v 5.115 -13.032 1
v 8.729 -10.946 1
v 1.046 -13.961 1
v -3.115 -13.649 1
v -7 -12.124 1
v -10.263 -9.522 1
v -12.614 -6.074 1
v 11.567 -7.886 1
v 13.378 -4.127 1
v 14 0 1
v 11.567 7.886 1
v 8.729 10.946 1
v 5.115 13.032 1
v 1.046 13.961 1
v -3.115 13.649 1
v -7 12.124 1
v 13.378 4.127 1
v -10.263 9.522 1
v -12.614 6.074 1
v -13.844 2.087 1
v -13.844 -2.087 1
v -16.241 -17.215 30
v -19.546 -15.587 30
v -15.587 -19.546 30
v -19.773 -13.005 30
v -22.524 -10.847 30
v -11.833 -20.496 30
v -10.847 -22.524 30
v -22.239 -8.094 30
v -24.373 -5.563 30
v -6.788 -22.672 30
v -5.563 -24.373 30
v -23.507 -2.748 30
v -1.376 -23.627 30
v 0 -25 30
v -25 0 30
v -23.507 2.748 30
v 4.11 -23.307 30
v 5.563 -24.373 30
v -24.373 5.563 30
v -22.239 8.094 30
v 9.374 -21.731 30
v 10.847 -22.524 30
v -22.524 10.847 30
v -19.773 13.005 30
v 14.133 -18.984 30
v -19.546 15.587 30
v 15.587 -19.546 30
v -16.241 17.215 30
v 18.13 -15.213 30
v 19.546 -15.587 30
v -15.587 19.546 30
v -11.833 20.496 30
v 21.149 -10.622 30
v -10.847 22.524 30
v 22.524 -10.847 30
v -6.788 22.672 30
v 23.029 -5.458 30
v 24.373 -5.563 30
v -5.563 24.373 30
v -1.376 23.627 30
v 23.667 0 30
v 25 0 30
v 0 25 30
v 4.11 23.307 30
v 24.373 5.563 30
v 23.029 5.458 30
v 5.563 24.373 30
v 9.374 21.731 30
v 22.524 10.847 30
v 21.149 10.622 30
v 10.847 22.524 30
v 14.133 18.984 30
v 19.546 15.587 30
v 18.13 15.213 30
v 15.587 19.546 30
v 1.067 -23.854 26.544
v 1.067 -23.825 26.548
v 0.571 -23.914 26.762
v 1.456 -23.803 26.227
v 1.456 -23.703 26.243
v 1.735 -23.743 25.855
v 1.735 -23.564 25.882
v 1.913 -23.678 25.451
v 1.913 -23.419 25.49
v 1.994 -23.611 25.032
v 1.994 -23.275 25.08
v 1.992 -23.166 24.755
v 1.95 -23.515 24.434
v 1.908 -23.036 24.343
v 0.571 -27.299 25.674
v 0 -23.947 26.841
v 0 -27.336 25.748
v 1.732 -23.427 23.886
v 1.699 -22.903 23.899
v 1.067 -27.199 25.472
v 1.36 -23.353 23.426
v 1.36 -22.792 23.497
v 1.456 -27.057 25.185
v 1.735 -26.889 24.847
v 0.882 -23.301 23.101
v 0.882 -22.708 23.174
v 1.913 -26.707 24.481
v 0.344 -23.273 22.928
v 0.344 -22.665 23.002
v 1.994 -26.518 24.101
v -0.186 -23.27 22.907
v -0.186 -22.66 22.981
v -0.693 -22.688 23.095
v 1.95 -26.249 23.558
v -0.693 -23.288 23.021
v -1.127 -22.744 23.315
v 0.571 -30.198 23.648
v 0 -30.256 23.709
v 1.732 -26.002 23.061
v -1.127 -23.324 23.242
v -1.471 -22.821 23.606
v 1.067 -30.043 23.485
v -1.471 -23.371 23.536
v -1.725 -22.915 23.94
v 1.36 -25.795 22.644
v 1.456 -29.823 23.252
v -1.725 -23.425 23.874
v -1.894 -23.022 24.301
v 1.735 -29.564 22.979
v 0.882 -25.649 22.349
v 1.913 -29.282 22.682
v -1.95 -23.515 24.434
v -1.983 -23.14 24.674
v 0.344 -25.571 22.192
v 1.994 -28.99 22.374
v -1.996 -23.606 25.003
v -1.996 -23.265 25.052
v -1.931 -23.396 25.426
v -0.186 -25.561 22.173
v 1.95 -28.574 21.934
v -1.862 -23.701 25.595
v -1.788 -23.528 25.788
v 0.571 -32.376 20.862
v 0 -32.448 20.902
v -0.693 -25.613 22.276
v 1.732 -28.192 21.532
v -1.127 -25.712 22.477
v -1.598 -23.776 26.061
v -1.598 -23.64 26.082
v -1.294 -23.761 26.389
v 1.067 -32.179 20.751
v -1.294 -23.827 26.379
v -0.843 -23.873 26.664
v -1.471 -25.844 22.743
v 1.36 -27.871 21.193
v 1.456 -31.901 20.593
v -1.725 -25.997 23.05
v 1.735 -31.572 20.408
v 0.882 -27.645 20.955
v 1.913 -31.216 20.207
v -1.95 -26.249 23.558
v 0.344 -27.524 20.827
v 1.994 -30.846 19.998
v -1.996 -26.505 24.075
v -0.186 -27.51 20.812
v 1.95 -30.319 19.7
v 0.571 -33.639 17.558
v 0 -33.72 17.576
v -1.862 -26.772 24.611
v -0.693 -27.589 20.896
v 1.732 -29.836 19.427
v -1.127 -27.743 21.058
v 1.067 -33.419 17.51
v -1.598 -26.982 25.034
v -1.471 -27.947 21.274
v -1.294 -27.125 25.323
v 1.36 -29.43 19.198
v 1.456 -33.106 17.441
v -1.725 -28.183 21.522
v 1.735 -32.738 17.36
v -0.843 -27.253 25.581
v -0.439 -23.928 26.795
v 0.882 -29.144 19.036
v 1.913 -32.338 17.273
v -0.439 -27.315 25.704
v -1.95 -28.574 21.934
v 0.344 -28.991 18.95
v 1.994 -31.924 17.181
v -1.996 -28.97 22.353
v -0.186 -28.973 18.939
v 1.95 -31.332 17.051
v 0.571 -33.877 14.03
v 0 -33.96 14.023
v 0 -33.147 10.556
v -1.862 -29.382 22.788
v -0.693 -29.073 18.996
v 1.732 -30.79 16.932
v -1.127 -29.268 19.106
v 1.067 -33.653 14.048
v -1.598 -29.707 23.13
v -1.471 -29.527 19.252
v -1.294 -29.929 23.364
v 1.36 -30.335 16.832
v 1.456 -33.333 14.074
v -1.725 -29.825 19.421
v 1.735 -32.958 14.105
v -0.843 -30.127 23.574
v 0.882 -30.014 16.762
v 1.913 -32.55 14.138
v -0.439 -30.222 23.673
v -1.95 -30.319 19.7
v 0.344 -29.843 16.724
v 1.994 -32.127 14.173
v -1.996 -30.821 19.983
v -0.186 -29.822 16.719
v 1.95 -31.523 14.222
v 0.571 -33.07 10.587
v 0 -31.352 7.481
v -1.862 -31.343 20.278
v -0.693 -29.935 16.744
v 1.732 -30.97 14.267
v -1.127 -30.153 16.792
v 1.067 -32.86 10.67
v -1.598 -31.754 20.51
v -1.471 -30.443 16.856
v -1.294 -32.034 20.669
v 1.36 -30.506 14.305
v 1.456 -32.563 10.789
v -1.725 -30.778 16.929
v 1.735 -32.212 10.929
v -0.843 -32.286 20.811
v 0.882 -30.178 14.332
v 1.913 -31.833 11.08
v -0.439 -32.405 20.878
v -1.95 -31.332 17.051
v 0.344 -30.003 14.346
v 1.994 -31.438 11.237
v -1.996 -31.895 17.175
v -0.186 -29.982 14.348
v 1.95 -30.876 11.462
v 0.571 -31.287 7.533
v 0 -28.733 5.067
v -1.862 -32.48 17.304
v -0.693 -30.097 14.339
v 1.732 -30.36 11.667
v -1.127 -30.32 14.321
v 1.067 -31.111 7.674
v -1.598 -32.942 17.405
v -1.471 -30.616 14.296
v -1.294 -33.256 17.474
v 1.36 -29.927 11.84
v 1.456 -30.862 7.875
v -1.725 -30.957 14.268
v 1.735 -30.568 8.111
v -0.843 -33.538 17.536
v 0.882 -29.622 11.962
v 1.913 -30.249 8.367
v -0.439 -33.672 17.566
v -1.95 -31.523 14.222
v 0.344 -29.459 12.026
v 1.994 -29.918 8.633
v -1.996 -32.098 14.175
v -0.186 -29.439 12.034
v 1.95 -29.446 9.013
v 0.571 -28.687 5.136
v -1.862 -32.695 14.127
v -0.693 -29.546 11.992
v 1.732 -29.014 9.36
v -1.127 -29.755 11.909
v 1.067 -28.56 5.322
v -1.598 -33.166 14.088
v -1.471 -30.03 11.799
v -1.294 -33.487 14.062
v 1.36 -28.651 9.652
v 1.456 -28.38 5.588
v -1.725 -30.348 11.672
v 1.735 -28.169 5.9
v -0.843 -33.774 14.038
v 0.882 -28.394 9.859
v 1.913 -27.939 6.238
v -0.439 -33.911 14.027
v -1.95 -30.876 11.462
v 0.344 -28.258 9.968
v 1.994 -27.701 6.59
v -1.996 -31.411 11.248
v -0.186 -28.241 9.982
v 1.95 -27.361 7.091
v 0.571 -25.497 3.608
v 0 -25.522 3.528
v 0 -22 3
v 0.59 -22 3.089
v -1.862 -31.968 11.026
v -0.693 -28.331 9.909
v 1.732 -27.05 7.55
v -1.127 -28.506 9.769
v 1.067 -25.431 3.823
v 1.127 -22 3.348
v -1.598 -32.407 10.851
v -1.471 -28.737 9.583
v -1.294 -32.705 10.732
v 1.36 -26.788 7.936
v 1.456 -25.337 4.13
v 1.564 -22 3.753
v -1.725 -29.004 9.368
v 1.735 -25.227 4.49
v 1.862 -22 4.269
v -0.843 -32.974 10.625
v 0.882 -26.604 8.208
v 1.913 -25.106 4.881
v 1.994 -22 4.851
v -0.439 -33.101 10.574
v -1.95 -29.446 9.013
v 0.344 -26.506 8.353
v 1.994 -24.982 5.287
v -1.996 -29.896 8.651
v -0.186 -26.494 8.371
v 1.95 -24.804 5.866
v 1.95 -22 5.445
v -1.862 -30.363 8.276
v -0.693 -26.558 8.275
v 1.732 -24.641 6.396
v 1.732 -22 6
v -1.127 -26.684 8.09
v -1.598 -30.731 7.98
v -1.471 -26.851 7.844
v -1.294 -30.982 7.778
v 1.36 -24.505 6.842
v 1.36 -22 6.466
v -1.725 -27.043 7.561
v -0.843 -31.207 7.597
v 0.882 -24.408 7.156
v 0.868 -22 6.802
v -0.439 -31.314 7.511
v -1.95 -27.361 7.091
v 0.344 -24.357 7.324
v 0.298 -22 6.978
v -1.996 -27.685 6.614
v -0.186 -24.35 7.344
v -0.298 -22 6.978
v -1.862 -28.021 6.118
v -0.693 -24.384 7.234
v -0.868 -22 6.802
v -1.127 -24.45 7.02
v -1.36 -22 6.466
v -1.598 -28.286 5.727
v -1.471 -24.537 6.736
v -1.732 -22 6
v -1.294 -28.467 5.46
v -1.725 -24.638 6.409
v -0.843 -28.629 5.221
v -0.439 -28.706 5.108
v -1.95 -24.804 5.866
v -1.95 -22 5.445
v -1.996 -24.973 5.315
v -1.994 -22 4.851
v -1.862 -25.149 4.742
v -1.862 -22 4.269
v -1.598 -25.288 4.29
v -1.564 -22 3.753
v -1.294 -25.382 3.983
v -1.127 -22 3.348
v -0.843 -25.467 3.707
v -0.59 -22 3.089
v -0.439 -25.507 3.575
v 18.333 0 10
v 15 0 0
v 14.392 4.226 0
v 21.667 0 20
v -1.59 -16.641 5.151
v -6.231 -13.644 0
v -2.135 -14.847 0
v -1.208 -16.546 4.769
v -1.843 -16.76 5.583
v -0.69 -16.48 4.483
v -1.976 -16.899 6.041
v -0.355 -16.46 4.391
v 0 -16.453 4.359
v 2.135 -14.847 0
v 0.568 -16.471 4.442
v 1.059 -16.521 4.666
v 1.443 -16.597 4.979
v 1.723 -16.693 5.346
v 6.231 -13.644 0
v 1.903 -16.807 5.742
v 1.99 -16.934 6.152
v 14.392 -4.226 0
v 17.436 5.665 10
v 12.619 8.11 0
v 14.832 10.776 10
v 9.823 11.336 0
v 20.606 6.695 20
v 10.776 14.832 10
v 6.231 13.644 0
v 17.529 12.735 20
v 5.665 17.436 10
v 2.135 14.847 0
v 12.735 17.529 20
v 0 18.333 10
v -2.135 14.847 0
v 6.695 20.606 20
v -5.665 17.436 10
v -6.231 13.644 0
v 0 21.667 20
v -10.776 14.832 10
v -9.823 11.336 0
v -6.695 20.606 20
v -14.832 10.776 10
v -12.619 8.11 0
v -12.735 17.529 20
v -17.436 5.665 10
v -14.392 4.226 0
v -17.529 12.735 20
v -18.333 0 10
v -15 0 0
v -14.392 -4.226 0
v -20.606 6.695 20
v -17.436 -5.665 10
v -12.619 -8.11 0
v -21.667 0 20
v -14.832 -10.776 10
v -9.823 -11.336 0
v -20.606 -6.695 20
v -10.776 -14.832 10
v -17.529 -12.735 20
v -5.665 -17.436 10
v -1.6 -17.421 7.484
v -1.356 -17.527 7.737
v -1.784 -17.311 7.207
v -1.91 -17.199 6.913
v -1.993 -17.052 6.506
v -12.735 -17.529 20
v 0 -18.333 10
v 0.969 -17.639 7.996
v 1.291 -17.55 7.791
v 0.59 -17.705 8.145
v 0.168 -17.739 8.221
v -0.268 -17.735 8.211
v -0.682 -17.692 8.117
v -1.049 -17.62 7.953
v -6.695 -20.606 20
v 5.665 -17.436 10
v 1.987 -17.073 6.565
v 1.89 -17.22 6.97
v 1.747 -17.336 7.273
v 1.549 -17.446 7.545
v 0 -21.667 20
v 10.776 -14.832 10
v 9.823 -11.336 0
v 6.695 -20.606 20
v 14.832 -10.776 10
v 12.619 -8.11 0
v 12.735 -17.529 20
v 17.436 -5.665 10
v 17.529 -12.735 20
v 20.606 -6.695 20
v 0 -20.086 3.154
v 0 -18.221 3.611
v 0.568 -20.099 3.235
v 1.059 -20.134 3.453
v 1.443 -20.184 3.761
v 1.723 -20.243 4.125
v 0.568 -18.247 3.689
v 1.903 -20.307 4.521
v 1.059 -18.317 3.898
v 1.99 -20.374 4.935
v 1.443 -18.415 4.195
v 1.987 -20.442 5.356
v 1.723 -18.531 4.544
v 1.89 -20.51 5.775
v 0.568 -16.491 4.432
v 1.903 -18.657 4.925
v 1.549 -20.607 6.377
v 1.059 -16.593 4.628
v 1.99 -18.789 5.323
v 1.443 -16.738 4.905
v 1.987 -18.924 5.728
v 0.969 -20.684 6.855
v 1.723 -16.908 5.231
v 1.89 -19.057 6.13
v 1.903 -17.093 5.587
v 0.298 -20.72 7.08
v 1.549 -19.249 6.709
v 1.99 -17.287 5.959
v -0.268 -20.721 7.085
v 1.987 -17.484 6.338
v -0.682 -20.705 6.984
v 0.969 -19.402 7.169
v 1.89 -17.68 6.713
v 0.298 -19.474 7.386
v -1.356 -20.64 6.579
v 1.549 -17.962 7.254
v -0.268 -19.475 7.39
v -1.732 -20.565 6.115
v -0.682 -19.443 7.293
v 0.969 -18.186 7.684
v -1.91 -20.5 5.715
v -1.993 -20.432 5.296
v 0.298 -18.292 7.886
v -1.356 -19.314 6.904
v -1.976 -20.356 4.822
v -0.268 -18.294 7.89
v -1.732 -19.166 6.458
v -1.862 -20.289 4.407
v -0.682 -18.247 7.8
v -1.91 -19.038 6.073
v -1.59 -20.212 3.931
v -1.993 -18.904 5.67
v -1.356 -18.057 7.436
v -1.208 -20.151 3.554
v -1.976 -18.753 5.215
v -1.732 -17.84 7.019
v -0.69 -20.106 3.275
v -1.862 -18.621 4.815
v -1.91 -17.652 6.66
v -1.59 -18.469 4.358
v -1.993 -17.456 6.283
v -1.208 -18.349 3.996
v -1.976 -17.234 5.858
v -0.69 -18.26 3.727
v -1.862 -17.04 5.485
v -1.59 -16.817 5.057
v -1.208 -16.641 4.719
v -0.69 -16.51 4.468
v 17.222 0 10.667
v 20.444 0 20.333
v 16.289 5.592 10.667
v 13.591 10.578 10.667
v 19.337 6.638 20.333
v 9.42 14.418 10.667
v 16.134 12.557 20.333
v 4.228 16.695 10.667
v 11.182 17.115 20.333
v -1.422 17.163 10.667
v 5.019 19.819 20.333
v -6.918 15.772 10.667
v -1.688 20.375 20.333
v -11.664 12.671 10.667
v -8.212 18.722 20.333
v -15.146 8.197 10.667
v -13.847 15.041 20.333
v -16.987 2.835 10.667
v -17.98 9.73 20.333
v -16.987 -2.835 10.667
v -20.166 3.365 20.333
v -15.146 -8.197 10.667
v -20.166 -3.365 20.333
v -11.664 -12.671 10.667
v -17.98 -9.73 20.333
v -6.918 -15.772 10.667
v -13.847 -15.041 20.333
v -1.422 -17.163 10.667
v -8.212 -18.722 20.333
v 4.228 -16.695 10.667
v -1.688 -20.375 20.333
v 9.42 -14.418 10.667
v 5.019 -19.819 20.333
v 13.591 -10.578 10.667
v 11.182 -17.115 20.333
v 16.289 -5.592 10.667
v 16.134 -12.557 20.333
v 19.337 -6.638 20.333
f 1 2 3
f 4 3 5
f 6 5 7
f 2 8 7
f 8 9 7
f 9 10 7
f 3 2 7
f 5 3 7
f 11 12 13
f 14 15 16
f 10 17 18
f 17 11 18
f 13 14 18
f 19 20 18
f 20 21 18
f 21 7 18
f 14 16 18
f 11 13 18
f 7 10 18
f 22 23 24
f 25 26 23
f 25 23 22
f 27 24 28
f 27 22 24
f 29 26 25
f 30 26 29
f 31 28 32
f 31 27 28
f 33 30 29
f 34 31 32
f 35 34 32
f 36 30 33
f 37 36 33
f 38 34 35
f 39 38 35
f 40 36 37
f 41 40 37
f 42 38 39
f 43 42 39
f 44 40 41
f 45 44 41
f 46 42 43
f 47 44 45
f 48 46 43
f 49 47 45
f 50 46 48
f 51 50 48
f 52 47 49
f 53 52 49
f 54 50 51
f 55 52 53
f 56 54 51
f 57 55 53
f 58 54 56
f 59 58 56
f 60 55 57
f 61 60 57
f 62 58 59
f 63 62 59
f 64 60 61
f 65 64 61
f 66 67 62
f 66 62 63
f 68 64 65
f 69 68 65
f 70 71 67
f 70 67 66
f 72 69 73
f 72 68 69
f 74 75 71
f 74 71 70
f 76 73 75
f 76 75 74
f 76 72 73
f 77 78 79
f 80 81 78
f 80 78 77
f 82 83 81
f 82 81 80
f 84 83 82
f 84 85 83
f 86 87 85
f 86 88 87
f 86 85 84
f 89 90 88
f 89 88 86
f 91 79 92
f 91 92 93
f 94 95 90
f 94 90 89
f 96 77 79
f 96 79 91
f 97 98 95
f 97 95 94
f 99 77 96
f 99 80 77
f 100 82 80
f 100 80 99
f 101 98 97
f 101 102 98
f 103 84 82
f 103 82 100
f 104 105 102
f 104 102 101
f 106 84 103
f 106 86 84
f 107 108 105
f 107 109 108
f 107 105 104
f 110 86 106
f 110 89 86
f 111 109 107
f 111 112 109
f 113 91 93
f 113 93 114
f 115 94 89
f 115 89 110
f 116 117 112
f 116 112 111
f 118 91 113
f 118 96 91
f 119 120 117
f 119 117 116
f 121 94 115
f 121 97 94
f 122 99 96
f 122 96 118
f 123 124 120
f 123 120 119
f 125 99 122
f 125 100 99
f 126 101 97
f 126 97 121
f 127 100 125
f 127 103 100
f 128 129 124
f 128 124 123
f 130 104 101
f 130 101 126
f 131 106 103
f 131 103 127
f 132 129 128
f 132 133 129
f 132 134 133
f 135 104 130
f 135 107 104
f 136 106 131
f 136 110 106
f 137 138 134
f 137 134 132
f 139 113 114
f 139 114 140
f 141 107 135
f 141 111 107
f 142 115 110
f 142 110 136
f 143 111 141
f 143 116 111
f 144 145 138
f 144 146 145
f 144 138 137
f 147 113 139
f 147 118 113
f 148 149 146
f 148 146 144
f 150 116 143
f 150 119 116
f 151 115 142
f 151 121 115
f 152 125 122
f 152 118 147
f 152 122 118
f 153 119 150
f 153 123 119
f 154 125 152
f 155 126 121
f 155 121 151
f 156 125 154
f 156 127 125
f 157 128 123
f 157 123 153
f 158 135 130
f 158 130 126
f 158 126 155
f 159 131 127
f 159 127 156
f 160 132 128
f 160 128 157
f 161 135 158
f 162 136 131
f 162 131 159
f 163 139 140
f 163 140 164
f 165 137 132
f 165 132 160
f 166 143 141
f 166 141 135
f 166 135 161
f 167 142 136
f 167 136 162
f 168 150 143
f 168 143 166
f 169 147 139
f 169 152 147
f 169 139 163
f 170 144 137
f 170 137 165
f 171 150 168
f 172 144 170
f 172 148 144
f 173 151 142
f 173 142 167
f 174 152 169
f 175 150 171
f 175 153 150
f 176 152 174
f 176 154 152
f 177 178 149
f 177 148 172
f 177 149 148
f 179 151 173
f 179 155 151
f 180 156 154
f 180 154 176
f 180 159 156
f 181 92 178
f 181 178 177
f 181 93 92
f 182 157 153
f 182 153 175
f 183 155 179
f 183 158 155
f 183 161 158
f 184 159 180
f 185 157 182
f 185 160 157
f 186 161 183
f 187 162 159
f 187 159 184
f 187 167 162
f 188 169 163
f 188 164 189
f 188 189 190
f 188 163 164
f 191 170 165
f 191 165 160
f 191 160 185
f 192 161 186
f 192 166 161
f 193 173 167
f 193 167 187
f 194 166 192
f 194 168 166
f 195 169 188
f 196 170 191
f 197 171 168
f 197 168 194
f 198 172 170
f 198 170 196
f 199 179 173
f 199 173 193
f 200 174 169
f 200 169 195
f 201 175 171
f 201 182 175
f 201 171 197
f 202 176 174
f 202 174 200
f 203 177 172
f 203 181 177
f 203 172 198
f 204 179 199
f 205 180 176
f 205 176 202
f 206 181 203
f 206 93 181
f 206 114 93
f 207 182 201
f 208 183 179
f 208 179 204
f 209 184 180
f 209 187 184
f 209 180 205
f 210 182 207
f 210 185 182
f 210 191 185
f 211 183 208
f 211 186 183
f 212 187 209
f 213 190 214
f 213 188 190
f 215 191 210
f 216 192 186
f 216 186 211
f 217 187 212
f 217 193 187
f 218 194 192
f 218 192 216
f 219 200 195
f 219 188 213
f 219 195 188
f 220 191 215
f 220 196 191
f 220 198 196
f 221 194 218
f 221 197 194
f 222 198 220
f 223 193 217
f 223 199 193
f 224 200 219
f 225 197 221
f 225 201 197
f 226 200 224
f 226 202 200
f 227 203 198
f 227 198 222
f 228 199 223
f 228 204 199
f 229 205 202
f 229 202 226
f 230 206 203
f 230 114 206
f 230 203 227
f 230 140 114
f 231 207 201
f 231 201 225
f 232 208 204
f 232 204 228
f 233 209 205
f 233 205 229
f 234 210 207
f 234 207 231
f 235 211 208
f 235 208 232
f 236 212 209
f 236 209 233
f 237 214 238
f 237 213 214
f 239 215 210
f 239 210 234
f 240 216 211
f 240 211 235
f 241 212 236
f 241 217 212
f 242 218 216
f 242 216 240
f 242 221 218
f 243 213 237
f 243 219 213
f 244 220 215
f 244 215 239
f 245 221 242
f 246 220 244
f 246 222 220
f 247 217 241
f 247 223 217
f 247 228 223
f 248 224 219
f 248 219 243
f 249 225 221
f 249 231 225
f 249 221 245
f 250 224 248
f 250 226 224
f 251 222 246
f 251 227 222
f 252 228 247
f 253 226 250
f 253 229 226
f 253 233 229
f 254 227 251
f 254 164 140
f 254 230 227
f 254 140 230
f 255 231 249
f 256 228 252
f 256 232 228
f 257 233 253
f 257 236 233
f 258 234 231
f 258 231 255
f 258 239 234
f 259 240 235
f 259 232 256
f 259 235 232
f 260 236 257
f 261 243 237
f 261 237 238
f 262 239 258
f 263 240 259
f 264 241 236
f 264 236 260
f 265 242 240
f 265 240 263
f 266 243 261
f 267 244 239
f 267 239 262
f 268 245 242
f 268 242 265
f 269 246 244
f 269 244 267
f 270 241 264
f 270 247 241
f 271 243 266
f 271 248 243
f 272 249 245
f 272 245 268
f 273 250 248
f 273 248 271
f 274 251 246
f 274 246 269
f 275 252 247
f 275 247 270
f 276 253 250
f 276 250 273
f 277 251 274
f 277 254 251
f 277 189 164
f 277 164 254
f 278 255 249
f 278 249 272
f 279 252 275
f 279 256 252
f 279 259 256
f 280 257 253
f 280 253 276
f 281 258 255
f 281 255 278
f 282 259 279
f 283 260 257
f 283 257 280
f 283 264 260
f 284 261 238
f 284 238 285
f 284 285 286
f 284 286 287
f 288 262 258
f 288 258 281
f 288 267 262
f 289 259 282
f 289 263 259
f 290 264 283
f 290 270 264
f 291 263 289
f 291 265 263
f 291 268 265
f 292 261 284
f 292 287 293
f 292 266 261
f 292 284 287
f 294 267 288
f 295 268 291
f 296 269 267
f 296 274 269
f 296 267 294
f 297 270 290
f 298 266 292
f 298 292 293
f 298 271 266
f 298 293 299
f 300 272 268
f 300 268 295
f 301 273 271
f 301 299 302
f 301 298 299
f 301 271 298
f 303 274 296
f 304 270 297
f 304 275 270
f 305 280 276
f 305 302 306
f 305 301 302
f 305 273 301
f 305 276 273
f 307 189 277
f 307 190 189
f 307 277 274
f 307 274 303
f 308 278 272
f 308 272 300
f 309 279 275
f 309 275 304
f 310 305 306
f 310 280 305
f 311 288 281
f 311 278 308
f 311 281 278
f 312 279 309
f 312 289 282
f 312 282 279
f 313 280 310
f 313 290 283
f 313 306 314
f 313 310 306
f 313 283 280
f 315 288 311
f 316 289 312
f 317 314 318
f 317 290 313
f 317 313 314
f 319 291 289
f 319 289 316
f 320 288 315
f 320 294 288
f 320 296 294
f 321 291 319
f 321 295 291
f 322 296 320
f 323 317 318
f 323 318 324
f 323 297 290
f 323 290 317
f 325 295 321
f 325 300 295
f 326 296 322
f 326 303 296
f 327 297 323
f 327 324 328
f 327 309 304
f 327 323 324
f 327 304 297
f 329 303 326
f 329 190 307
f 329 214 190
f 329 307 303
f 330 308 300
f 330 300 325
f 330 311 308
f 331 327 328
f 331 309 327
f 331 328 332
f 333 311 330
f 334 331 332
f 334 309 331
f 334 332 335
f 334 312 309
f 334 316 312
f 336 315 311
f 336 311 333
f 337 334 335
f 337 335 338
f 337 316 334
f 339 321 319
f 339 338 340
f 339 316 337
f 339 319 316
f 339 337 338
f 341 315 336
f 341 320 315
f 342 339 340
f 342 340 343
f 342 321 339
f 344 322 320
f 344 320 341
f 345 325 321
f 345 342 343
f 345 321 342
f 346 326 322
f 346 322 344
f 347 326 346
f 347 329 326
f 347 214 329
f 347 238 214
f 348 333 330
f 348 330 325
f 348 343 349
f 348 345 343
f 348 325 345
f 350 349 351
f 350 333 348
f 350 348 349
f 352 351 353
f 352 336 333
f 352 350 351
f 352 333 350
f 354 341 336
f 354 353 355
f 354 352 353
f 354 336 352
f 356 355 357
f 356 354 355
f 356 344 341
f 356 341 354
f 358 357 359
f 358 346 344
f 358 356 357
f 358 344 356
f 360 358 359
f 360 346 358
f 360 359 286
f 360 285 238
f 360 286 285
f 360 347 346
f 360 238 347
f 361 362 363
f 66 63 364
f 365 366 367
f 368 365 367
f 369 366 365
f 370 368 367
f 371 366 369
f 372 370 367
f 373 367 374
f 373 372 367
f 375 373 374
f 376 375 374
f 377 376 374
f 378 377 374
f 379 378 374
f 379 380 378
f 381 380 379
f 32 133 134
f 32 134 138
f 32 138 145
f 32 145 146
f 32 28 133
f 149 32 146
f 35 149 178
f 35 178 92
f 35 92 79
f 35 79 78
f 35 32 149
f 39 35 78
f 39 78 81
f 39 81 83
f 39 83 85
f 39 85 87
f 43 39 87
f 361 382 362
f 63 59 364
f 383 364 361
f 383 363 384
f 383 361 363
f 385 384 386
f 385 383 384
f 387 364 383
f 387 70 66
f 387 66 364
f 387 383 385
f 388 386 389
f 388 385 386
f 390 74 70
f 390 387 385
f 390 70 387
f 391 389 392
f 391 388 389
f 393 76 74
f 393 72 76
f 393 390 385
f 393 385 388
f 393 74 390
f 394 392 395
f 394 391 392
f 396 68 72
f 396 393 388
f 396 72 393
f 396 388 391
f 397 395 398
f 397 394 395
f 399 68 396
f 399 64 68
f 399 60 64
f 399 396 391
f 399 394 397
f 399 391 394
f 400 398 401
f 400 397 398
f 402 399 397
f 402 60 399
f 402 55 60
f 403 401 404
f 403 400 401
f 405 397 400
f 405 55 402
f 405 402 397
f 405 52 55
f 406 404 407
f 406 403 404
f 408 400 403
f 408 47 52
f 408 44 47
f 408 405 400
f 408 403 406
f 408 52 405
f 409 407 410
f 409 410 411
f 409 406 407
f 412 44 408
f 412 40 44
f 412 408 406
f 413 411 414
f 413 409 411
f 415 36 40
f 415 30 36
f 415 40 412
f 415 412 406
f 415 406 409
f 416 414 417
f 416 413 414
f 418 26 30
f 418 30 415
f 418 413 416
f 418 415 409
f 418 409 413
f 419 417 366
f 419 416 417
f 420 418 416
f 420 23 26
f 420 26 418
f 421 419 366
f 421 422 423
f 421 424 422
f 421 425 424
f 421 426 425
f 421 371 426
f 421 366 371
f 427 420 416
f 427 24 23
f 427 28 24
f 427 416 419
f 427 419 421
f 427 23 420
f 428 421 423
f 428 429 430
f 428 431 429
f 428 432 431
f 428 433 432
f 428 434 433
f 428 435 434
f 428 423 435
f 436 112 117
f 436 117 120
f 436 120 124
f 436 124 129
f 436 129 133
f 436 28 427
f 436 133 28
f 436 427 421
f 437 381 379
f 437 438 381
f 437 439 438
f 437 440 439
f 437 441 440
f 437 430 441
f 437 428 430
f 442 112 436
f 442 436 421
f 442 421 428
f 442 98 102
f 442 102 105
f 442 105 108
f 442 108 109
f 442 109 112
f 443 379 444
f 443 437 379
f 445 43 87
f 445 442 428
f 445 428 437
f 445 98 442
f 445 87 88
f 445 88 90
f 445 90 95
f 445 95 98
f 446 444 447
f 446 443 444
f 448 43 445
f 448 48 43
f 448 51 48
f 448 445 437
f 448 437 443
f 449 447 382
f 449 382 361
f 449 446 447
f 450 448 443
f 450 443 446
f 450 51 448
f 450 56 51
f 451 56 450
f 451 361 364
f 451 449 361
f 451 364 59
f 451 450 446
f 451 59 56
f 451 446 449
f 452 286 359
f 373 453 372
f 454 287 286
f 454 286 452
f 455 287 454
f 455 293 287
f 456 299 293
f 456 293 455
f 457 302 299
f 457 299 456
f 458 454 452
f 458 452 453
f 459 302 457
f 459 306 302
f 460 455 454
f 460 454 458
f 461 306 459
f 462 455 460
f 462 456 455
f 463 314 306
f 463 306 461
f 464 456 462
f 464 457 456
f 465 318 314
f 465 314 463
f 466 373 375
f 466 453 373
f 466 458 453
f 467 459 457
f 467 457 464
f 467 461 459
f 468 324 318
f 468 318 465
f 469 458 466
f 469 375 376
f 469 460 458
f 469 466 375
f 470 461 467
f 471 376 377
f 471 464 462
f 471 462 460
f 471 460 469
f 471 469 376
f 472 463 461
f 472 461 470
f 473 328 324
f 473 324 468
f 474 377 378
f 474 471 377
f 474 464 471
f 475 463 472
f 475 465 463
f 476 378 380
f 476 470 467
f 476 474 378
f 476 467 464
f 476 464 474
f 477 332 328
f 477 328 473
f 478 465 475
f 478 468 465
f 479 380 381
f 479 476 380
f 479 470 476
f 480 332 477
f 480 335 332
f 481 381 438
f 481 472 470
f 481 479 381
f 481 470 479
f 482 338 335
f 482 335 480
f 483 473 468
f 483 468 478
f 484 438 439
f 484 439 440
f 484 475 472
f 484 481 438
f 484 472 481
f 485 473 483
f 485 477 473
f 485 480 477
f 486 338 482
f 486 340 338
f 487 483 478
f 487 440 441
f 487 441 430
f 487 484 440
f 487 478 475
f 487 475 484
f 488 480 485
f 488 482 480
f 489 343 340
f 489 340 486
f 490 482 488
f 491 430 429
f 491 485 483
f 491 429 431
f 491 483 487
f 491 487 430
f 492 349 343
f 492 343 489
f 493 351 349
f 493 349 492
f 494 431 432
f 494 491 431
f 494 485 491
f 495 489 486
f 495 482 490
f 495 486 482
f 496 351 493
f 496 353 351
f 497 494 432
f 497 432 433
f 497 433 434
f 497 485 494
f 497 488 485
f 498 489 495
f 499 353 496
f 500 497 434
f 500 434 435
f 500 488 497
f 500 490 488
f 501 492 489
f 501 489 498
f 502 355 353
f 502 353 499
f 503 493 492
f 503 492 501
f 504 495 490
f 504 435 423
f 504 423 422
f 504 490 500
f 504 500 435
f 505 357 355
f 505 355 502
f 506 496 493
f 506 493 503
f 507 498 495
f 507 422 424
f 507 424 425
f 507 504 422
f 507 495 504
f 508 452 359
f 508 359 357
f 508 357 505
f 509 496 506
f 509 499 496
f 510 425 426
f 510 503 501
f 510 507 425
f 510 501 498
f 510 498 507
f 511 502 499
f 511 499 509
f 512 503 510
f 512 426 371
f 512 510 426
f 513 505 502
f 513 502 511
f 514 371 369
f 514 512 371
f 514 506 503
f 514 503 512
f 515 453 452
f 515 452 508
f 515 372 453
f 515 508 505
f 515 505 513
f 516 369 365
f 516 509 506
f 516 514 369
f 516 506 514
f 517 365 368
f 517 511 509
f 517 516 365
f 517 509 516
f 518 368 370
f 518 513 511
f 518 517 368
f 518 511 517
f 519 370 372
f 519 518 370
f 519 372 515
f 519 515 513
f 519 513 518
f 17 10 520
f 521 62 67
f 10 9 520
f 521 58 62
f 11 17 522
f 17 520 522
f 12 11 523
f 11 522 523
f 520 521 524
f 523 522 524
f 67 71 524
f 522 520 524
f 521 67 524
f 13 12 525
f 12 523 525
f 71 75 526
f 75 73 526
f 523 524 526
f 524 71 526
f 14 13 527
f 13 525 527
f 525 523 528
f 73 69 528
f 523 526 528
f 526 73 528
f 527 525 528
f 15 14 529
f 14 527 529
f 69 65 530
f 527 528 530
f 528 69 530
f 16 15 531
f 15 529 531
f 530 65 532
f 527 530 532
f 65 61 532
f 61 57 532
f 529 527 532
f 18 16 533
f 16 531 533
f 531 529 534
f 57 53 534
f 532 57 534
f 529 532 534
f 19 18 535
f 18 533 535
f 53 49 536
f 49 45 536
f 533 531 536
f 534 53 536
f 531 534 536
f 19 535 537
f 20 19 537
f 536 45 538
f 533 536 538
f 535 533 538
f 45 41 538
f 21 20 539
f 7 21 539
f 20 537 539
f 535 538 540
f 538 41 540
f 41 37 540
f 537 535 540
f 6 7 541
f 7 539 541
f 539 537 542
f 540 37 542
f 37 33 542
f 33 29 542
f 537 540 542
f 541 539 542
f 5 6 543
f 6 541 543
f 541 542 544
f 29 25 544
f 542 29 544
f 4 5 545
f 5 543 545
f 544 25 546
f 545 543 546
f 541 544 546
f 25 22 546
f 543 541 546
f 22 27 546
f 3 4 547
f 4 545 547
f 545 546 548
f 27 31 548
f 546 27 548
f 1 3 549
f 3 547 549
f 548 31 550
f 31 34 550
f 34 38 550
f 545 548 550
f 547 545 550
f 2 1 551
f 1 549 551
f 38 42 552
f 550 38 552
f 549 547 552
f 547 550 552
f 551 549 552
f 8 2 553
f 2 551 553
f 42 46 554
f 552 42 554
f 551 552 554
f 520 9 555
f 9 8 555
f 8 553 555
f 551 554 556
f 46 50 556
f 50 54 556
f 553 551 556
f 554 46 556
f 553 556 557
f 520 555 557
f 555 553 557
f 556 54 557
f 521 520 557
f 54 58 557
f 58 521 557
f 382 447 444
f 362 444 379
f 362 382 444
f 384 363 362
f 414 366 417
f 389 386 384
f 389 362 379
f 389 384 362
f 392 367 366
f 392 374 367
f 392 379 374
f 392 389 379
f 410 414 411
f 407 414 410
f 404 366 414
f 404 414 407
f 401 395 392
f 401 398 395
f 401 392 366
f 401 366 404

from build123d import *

# Parameters (mm, degrees)
TORUS_R = 2


with BuildPart() as cono001:
    # Cone001 → Cone001 (revolve)
    with BuildSketch(Plane(origin=(0, 0, 1), x_dir=(1, 0, 0), z_dir=(0, -1, 0))):
        Polygon((0, 0), (14, 0), (24, 30), (0, 30), align=None)
    revolve(axis=Axis((0, 0, 1), (0, 0, 1)))


with BuildPart() as toro:
    # Torus → Torus (revolve)
    with BuildSketch(Plane(origin=(0, -22, 15), x_dir=(0, 0, -1), z_dir=(0, -1, 0))):
        with Locations((10, 0)):
            Circle(TORUS_R)
    revolve(axis=Axis((0, -22, 15), (1, 0, 0)))


with BuildPart() as cut:
    # Cone → Cone (revolve)
    with BuildSketch(Plane.XZ):
        Polygon((0, 0), (15, 0), (25, 30), (0, 30), align=None)
    revolve(axis=Axis((0, 0, 0), (0, 0, 1)))

    # Fusion: union Toro
    add(toro.part)

    # Cut: cut Cono001
    add(cono001.part, mode=Mode.SUBTRACT)


solid = cut.part
